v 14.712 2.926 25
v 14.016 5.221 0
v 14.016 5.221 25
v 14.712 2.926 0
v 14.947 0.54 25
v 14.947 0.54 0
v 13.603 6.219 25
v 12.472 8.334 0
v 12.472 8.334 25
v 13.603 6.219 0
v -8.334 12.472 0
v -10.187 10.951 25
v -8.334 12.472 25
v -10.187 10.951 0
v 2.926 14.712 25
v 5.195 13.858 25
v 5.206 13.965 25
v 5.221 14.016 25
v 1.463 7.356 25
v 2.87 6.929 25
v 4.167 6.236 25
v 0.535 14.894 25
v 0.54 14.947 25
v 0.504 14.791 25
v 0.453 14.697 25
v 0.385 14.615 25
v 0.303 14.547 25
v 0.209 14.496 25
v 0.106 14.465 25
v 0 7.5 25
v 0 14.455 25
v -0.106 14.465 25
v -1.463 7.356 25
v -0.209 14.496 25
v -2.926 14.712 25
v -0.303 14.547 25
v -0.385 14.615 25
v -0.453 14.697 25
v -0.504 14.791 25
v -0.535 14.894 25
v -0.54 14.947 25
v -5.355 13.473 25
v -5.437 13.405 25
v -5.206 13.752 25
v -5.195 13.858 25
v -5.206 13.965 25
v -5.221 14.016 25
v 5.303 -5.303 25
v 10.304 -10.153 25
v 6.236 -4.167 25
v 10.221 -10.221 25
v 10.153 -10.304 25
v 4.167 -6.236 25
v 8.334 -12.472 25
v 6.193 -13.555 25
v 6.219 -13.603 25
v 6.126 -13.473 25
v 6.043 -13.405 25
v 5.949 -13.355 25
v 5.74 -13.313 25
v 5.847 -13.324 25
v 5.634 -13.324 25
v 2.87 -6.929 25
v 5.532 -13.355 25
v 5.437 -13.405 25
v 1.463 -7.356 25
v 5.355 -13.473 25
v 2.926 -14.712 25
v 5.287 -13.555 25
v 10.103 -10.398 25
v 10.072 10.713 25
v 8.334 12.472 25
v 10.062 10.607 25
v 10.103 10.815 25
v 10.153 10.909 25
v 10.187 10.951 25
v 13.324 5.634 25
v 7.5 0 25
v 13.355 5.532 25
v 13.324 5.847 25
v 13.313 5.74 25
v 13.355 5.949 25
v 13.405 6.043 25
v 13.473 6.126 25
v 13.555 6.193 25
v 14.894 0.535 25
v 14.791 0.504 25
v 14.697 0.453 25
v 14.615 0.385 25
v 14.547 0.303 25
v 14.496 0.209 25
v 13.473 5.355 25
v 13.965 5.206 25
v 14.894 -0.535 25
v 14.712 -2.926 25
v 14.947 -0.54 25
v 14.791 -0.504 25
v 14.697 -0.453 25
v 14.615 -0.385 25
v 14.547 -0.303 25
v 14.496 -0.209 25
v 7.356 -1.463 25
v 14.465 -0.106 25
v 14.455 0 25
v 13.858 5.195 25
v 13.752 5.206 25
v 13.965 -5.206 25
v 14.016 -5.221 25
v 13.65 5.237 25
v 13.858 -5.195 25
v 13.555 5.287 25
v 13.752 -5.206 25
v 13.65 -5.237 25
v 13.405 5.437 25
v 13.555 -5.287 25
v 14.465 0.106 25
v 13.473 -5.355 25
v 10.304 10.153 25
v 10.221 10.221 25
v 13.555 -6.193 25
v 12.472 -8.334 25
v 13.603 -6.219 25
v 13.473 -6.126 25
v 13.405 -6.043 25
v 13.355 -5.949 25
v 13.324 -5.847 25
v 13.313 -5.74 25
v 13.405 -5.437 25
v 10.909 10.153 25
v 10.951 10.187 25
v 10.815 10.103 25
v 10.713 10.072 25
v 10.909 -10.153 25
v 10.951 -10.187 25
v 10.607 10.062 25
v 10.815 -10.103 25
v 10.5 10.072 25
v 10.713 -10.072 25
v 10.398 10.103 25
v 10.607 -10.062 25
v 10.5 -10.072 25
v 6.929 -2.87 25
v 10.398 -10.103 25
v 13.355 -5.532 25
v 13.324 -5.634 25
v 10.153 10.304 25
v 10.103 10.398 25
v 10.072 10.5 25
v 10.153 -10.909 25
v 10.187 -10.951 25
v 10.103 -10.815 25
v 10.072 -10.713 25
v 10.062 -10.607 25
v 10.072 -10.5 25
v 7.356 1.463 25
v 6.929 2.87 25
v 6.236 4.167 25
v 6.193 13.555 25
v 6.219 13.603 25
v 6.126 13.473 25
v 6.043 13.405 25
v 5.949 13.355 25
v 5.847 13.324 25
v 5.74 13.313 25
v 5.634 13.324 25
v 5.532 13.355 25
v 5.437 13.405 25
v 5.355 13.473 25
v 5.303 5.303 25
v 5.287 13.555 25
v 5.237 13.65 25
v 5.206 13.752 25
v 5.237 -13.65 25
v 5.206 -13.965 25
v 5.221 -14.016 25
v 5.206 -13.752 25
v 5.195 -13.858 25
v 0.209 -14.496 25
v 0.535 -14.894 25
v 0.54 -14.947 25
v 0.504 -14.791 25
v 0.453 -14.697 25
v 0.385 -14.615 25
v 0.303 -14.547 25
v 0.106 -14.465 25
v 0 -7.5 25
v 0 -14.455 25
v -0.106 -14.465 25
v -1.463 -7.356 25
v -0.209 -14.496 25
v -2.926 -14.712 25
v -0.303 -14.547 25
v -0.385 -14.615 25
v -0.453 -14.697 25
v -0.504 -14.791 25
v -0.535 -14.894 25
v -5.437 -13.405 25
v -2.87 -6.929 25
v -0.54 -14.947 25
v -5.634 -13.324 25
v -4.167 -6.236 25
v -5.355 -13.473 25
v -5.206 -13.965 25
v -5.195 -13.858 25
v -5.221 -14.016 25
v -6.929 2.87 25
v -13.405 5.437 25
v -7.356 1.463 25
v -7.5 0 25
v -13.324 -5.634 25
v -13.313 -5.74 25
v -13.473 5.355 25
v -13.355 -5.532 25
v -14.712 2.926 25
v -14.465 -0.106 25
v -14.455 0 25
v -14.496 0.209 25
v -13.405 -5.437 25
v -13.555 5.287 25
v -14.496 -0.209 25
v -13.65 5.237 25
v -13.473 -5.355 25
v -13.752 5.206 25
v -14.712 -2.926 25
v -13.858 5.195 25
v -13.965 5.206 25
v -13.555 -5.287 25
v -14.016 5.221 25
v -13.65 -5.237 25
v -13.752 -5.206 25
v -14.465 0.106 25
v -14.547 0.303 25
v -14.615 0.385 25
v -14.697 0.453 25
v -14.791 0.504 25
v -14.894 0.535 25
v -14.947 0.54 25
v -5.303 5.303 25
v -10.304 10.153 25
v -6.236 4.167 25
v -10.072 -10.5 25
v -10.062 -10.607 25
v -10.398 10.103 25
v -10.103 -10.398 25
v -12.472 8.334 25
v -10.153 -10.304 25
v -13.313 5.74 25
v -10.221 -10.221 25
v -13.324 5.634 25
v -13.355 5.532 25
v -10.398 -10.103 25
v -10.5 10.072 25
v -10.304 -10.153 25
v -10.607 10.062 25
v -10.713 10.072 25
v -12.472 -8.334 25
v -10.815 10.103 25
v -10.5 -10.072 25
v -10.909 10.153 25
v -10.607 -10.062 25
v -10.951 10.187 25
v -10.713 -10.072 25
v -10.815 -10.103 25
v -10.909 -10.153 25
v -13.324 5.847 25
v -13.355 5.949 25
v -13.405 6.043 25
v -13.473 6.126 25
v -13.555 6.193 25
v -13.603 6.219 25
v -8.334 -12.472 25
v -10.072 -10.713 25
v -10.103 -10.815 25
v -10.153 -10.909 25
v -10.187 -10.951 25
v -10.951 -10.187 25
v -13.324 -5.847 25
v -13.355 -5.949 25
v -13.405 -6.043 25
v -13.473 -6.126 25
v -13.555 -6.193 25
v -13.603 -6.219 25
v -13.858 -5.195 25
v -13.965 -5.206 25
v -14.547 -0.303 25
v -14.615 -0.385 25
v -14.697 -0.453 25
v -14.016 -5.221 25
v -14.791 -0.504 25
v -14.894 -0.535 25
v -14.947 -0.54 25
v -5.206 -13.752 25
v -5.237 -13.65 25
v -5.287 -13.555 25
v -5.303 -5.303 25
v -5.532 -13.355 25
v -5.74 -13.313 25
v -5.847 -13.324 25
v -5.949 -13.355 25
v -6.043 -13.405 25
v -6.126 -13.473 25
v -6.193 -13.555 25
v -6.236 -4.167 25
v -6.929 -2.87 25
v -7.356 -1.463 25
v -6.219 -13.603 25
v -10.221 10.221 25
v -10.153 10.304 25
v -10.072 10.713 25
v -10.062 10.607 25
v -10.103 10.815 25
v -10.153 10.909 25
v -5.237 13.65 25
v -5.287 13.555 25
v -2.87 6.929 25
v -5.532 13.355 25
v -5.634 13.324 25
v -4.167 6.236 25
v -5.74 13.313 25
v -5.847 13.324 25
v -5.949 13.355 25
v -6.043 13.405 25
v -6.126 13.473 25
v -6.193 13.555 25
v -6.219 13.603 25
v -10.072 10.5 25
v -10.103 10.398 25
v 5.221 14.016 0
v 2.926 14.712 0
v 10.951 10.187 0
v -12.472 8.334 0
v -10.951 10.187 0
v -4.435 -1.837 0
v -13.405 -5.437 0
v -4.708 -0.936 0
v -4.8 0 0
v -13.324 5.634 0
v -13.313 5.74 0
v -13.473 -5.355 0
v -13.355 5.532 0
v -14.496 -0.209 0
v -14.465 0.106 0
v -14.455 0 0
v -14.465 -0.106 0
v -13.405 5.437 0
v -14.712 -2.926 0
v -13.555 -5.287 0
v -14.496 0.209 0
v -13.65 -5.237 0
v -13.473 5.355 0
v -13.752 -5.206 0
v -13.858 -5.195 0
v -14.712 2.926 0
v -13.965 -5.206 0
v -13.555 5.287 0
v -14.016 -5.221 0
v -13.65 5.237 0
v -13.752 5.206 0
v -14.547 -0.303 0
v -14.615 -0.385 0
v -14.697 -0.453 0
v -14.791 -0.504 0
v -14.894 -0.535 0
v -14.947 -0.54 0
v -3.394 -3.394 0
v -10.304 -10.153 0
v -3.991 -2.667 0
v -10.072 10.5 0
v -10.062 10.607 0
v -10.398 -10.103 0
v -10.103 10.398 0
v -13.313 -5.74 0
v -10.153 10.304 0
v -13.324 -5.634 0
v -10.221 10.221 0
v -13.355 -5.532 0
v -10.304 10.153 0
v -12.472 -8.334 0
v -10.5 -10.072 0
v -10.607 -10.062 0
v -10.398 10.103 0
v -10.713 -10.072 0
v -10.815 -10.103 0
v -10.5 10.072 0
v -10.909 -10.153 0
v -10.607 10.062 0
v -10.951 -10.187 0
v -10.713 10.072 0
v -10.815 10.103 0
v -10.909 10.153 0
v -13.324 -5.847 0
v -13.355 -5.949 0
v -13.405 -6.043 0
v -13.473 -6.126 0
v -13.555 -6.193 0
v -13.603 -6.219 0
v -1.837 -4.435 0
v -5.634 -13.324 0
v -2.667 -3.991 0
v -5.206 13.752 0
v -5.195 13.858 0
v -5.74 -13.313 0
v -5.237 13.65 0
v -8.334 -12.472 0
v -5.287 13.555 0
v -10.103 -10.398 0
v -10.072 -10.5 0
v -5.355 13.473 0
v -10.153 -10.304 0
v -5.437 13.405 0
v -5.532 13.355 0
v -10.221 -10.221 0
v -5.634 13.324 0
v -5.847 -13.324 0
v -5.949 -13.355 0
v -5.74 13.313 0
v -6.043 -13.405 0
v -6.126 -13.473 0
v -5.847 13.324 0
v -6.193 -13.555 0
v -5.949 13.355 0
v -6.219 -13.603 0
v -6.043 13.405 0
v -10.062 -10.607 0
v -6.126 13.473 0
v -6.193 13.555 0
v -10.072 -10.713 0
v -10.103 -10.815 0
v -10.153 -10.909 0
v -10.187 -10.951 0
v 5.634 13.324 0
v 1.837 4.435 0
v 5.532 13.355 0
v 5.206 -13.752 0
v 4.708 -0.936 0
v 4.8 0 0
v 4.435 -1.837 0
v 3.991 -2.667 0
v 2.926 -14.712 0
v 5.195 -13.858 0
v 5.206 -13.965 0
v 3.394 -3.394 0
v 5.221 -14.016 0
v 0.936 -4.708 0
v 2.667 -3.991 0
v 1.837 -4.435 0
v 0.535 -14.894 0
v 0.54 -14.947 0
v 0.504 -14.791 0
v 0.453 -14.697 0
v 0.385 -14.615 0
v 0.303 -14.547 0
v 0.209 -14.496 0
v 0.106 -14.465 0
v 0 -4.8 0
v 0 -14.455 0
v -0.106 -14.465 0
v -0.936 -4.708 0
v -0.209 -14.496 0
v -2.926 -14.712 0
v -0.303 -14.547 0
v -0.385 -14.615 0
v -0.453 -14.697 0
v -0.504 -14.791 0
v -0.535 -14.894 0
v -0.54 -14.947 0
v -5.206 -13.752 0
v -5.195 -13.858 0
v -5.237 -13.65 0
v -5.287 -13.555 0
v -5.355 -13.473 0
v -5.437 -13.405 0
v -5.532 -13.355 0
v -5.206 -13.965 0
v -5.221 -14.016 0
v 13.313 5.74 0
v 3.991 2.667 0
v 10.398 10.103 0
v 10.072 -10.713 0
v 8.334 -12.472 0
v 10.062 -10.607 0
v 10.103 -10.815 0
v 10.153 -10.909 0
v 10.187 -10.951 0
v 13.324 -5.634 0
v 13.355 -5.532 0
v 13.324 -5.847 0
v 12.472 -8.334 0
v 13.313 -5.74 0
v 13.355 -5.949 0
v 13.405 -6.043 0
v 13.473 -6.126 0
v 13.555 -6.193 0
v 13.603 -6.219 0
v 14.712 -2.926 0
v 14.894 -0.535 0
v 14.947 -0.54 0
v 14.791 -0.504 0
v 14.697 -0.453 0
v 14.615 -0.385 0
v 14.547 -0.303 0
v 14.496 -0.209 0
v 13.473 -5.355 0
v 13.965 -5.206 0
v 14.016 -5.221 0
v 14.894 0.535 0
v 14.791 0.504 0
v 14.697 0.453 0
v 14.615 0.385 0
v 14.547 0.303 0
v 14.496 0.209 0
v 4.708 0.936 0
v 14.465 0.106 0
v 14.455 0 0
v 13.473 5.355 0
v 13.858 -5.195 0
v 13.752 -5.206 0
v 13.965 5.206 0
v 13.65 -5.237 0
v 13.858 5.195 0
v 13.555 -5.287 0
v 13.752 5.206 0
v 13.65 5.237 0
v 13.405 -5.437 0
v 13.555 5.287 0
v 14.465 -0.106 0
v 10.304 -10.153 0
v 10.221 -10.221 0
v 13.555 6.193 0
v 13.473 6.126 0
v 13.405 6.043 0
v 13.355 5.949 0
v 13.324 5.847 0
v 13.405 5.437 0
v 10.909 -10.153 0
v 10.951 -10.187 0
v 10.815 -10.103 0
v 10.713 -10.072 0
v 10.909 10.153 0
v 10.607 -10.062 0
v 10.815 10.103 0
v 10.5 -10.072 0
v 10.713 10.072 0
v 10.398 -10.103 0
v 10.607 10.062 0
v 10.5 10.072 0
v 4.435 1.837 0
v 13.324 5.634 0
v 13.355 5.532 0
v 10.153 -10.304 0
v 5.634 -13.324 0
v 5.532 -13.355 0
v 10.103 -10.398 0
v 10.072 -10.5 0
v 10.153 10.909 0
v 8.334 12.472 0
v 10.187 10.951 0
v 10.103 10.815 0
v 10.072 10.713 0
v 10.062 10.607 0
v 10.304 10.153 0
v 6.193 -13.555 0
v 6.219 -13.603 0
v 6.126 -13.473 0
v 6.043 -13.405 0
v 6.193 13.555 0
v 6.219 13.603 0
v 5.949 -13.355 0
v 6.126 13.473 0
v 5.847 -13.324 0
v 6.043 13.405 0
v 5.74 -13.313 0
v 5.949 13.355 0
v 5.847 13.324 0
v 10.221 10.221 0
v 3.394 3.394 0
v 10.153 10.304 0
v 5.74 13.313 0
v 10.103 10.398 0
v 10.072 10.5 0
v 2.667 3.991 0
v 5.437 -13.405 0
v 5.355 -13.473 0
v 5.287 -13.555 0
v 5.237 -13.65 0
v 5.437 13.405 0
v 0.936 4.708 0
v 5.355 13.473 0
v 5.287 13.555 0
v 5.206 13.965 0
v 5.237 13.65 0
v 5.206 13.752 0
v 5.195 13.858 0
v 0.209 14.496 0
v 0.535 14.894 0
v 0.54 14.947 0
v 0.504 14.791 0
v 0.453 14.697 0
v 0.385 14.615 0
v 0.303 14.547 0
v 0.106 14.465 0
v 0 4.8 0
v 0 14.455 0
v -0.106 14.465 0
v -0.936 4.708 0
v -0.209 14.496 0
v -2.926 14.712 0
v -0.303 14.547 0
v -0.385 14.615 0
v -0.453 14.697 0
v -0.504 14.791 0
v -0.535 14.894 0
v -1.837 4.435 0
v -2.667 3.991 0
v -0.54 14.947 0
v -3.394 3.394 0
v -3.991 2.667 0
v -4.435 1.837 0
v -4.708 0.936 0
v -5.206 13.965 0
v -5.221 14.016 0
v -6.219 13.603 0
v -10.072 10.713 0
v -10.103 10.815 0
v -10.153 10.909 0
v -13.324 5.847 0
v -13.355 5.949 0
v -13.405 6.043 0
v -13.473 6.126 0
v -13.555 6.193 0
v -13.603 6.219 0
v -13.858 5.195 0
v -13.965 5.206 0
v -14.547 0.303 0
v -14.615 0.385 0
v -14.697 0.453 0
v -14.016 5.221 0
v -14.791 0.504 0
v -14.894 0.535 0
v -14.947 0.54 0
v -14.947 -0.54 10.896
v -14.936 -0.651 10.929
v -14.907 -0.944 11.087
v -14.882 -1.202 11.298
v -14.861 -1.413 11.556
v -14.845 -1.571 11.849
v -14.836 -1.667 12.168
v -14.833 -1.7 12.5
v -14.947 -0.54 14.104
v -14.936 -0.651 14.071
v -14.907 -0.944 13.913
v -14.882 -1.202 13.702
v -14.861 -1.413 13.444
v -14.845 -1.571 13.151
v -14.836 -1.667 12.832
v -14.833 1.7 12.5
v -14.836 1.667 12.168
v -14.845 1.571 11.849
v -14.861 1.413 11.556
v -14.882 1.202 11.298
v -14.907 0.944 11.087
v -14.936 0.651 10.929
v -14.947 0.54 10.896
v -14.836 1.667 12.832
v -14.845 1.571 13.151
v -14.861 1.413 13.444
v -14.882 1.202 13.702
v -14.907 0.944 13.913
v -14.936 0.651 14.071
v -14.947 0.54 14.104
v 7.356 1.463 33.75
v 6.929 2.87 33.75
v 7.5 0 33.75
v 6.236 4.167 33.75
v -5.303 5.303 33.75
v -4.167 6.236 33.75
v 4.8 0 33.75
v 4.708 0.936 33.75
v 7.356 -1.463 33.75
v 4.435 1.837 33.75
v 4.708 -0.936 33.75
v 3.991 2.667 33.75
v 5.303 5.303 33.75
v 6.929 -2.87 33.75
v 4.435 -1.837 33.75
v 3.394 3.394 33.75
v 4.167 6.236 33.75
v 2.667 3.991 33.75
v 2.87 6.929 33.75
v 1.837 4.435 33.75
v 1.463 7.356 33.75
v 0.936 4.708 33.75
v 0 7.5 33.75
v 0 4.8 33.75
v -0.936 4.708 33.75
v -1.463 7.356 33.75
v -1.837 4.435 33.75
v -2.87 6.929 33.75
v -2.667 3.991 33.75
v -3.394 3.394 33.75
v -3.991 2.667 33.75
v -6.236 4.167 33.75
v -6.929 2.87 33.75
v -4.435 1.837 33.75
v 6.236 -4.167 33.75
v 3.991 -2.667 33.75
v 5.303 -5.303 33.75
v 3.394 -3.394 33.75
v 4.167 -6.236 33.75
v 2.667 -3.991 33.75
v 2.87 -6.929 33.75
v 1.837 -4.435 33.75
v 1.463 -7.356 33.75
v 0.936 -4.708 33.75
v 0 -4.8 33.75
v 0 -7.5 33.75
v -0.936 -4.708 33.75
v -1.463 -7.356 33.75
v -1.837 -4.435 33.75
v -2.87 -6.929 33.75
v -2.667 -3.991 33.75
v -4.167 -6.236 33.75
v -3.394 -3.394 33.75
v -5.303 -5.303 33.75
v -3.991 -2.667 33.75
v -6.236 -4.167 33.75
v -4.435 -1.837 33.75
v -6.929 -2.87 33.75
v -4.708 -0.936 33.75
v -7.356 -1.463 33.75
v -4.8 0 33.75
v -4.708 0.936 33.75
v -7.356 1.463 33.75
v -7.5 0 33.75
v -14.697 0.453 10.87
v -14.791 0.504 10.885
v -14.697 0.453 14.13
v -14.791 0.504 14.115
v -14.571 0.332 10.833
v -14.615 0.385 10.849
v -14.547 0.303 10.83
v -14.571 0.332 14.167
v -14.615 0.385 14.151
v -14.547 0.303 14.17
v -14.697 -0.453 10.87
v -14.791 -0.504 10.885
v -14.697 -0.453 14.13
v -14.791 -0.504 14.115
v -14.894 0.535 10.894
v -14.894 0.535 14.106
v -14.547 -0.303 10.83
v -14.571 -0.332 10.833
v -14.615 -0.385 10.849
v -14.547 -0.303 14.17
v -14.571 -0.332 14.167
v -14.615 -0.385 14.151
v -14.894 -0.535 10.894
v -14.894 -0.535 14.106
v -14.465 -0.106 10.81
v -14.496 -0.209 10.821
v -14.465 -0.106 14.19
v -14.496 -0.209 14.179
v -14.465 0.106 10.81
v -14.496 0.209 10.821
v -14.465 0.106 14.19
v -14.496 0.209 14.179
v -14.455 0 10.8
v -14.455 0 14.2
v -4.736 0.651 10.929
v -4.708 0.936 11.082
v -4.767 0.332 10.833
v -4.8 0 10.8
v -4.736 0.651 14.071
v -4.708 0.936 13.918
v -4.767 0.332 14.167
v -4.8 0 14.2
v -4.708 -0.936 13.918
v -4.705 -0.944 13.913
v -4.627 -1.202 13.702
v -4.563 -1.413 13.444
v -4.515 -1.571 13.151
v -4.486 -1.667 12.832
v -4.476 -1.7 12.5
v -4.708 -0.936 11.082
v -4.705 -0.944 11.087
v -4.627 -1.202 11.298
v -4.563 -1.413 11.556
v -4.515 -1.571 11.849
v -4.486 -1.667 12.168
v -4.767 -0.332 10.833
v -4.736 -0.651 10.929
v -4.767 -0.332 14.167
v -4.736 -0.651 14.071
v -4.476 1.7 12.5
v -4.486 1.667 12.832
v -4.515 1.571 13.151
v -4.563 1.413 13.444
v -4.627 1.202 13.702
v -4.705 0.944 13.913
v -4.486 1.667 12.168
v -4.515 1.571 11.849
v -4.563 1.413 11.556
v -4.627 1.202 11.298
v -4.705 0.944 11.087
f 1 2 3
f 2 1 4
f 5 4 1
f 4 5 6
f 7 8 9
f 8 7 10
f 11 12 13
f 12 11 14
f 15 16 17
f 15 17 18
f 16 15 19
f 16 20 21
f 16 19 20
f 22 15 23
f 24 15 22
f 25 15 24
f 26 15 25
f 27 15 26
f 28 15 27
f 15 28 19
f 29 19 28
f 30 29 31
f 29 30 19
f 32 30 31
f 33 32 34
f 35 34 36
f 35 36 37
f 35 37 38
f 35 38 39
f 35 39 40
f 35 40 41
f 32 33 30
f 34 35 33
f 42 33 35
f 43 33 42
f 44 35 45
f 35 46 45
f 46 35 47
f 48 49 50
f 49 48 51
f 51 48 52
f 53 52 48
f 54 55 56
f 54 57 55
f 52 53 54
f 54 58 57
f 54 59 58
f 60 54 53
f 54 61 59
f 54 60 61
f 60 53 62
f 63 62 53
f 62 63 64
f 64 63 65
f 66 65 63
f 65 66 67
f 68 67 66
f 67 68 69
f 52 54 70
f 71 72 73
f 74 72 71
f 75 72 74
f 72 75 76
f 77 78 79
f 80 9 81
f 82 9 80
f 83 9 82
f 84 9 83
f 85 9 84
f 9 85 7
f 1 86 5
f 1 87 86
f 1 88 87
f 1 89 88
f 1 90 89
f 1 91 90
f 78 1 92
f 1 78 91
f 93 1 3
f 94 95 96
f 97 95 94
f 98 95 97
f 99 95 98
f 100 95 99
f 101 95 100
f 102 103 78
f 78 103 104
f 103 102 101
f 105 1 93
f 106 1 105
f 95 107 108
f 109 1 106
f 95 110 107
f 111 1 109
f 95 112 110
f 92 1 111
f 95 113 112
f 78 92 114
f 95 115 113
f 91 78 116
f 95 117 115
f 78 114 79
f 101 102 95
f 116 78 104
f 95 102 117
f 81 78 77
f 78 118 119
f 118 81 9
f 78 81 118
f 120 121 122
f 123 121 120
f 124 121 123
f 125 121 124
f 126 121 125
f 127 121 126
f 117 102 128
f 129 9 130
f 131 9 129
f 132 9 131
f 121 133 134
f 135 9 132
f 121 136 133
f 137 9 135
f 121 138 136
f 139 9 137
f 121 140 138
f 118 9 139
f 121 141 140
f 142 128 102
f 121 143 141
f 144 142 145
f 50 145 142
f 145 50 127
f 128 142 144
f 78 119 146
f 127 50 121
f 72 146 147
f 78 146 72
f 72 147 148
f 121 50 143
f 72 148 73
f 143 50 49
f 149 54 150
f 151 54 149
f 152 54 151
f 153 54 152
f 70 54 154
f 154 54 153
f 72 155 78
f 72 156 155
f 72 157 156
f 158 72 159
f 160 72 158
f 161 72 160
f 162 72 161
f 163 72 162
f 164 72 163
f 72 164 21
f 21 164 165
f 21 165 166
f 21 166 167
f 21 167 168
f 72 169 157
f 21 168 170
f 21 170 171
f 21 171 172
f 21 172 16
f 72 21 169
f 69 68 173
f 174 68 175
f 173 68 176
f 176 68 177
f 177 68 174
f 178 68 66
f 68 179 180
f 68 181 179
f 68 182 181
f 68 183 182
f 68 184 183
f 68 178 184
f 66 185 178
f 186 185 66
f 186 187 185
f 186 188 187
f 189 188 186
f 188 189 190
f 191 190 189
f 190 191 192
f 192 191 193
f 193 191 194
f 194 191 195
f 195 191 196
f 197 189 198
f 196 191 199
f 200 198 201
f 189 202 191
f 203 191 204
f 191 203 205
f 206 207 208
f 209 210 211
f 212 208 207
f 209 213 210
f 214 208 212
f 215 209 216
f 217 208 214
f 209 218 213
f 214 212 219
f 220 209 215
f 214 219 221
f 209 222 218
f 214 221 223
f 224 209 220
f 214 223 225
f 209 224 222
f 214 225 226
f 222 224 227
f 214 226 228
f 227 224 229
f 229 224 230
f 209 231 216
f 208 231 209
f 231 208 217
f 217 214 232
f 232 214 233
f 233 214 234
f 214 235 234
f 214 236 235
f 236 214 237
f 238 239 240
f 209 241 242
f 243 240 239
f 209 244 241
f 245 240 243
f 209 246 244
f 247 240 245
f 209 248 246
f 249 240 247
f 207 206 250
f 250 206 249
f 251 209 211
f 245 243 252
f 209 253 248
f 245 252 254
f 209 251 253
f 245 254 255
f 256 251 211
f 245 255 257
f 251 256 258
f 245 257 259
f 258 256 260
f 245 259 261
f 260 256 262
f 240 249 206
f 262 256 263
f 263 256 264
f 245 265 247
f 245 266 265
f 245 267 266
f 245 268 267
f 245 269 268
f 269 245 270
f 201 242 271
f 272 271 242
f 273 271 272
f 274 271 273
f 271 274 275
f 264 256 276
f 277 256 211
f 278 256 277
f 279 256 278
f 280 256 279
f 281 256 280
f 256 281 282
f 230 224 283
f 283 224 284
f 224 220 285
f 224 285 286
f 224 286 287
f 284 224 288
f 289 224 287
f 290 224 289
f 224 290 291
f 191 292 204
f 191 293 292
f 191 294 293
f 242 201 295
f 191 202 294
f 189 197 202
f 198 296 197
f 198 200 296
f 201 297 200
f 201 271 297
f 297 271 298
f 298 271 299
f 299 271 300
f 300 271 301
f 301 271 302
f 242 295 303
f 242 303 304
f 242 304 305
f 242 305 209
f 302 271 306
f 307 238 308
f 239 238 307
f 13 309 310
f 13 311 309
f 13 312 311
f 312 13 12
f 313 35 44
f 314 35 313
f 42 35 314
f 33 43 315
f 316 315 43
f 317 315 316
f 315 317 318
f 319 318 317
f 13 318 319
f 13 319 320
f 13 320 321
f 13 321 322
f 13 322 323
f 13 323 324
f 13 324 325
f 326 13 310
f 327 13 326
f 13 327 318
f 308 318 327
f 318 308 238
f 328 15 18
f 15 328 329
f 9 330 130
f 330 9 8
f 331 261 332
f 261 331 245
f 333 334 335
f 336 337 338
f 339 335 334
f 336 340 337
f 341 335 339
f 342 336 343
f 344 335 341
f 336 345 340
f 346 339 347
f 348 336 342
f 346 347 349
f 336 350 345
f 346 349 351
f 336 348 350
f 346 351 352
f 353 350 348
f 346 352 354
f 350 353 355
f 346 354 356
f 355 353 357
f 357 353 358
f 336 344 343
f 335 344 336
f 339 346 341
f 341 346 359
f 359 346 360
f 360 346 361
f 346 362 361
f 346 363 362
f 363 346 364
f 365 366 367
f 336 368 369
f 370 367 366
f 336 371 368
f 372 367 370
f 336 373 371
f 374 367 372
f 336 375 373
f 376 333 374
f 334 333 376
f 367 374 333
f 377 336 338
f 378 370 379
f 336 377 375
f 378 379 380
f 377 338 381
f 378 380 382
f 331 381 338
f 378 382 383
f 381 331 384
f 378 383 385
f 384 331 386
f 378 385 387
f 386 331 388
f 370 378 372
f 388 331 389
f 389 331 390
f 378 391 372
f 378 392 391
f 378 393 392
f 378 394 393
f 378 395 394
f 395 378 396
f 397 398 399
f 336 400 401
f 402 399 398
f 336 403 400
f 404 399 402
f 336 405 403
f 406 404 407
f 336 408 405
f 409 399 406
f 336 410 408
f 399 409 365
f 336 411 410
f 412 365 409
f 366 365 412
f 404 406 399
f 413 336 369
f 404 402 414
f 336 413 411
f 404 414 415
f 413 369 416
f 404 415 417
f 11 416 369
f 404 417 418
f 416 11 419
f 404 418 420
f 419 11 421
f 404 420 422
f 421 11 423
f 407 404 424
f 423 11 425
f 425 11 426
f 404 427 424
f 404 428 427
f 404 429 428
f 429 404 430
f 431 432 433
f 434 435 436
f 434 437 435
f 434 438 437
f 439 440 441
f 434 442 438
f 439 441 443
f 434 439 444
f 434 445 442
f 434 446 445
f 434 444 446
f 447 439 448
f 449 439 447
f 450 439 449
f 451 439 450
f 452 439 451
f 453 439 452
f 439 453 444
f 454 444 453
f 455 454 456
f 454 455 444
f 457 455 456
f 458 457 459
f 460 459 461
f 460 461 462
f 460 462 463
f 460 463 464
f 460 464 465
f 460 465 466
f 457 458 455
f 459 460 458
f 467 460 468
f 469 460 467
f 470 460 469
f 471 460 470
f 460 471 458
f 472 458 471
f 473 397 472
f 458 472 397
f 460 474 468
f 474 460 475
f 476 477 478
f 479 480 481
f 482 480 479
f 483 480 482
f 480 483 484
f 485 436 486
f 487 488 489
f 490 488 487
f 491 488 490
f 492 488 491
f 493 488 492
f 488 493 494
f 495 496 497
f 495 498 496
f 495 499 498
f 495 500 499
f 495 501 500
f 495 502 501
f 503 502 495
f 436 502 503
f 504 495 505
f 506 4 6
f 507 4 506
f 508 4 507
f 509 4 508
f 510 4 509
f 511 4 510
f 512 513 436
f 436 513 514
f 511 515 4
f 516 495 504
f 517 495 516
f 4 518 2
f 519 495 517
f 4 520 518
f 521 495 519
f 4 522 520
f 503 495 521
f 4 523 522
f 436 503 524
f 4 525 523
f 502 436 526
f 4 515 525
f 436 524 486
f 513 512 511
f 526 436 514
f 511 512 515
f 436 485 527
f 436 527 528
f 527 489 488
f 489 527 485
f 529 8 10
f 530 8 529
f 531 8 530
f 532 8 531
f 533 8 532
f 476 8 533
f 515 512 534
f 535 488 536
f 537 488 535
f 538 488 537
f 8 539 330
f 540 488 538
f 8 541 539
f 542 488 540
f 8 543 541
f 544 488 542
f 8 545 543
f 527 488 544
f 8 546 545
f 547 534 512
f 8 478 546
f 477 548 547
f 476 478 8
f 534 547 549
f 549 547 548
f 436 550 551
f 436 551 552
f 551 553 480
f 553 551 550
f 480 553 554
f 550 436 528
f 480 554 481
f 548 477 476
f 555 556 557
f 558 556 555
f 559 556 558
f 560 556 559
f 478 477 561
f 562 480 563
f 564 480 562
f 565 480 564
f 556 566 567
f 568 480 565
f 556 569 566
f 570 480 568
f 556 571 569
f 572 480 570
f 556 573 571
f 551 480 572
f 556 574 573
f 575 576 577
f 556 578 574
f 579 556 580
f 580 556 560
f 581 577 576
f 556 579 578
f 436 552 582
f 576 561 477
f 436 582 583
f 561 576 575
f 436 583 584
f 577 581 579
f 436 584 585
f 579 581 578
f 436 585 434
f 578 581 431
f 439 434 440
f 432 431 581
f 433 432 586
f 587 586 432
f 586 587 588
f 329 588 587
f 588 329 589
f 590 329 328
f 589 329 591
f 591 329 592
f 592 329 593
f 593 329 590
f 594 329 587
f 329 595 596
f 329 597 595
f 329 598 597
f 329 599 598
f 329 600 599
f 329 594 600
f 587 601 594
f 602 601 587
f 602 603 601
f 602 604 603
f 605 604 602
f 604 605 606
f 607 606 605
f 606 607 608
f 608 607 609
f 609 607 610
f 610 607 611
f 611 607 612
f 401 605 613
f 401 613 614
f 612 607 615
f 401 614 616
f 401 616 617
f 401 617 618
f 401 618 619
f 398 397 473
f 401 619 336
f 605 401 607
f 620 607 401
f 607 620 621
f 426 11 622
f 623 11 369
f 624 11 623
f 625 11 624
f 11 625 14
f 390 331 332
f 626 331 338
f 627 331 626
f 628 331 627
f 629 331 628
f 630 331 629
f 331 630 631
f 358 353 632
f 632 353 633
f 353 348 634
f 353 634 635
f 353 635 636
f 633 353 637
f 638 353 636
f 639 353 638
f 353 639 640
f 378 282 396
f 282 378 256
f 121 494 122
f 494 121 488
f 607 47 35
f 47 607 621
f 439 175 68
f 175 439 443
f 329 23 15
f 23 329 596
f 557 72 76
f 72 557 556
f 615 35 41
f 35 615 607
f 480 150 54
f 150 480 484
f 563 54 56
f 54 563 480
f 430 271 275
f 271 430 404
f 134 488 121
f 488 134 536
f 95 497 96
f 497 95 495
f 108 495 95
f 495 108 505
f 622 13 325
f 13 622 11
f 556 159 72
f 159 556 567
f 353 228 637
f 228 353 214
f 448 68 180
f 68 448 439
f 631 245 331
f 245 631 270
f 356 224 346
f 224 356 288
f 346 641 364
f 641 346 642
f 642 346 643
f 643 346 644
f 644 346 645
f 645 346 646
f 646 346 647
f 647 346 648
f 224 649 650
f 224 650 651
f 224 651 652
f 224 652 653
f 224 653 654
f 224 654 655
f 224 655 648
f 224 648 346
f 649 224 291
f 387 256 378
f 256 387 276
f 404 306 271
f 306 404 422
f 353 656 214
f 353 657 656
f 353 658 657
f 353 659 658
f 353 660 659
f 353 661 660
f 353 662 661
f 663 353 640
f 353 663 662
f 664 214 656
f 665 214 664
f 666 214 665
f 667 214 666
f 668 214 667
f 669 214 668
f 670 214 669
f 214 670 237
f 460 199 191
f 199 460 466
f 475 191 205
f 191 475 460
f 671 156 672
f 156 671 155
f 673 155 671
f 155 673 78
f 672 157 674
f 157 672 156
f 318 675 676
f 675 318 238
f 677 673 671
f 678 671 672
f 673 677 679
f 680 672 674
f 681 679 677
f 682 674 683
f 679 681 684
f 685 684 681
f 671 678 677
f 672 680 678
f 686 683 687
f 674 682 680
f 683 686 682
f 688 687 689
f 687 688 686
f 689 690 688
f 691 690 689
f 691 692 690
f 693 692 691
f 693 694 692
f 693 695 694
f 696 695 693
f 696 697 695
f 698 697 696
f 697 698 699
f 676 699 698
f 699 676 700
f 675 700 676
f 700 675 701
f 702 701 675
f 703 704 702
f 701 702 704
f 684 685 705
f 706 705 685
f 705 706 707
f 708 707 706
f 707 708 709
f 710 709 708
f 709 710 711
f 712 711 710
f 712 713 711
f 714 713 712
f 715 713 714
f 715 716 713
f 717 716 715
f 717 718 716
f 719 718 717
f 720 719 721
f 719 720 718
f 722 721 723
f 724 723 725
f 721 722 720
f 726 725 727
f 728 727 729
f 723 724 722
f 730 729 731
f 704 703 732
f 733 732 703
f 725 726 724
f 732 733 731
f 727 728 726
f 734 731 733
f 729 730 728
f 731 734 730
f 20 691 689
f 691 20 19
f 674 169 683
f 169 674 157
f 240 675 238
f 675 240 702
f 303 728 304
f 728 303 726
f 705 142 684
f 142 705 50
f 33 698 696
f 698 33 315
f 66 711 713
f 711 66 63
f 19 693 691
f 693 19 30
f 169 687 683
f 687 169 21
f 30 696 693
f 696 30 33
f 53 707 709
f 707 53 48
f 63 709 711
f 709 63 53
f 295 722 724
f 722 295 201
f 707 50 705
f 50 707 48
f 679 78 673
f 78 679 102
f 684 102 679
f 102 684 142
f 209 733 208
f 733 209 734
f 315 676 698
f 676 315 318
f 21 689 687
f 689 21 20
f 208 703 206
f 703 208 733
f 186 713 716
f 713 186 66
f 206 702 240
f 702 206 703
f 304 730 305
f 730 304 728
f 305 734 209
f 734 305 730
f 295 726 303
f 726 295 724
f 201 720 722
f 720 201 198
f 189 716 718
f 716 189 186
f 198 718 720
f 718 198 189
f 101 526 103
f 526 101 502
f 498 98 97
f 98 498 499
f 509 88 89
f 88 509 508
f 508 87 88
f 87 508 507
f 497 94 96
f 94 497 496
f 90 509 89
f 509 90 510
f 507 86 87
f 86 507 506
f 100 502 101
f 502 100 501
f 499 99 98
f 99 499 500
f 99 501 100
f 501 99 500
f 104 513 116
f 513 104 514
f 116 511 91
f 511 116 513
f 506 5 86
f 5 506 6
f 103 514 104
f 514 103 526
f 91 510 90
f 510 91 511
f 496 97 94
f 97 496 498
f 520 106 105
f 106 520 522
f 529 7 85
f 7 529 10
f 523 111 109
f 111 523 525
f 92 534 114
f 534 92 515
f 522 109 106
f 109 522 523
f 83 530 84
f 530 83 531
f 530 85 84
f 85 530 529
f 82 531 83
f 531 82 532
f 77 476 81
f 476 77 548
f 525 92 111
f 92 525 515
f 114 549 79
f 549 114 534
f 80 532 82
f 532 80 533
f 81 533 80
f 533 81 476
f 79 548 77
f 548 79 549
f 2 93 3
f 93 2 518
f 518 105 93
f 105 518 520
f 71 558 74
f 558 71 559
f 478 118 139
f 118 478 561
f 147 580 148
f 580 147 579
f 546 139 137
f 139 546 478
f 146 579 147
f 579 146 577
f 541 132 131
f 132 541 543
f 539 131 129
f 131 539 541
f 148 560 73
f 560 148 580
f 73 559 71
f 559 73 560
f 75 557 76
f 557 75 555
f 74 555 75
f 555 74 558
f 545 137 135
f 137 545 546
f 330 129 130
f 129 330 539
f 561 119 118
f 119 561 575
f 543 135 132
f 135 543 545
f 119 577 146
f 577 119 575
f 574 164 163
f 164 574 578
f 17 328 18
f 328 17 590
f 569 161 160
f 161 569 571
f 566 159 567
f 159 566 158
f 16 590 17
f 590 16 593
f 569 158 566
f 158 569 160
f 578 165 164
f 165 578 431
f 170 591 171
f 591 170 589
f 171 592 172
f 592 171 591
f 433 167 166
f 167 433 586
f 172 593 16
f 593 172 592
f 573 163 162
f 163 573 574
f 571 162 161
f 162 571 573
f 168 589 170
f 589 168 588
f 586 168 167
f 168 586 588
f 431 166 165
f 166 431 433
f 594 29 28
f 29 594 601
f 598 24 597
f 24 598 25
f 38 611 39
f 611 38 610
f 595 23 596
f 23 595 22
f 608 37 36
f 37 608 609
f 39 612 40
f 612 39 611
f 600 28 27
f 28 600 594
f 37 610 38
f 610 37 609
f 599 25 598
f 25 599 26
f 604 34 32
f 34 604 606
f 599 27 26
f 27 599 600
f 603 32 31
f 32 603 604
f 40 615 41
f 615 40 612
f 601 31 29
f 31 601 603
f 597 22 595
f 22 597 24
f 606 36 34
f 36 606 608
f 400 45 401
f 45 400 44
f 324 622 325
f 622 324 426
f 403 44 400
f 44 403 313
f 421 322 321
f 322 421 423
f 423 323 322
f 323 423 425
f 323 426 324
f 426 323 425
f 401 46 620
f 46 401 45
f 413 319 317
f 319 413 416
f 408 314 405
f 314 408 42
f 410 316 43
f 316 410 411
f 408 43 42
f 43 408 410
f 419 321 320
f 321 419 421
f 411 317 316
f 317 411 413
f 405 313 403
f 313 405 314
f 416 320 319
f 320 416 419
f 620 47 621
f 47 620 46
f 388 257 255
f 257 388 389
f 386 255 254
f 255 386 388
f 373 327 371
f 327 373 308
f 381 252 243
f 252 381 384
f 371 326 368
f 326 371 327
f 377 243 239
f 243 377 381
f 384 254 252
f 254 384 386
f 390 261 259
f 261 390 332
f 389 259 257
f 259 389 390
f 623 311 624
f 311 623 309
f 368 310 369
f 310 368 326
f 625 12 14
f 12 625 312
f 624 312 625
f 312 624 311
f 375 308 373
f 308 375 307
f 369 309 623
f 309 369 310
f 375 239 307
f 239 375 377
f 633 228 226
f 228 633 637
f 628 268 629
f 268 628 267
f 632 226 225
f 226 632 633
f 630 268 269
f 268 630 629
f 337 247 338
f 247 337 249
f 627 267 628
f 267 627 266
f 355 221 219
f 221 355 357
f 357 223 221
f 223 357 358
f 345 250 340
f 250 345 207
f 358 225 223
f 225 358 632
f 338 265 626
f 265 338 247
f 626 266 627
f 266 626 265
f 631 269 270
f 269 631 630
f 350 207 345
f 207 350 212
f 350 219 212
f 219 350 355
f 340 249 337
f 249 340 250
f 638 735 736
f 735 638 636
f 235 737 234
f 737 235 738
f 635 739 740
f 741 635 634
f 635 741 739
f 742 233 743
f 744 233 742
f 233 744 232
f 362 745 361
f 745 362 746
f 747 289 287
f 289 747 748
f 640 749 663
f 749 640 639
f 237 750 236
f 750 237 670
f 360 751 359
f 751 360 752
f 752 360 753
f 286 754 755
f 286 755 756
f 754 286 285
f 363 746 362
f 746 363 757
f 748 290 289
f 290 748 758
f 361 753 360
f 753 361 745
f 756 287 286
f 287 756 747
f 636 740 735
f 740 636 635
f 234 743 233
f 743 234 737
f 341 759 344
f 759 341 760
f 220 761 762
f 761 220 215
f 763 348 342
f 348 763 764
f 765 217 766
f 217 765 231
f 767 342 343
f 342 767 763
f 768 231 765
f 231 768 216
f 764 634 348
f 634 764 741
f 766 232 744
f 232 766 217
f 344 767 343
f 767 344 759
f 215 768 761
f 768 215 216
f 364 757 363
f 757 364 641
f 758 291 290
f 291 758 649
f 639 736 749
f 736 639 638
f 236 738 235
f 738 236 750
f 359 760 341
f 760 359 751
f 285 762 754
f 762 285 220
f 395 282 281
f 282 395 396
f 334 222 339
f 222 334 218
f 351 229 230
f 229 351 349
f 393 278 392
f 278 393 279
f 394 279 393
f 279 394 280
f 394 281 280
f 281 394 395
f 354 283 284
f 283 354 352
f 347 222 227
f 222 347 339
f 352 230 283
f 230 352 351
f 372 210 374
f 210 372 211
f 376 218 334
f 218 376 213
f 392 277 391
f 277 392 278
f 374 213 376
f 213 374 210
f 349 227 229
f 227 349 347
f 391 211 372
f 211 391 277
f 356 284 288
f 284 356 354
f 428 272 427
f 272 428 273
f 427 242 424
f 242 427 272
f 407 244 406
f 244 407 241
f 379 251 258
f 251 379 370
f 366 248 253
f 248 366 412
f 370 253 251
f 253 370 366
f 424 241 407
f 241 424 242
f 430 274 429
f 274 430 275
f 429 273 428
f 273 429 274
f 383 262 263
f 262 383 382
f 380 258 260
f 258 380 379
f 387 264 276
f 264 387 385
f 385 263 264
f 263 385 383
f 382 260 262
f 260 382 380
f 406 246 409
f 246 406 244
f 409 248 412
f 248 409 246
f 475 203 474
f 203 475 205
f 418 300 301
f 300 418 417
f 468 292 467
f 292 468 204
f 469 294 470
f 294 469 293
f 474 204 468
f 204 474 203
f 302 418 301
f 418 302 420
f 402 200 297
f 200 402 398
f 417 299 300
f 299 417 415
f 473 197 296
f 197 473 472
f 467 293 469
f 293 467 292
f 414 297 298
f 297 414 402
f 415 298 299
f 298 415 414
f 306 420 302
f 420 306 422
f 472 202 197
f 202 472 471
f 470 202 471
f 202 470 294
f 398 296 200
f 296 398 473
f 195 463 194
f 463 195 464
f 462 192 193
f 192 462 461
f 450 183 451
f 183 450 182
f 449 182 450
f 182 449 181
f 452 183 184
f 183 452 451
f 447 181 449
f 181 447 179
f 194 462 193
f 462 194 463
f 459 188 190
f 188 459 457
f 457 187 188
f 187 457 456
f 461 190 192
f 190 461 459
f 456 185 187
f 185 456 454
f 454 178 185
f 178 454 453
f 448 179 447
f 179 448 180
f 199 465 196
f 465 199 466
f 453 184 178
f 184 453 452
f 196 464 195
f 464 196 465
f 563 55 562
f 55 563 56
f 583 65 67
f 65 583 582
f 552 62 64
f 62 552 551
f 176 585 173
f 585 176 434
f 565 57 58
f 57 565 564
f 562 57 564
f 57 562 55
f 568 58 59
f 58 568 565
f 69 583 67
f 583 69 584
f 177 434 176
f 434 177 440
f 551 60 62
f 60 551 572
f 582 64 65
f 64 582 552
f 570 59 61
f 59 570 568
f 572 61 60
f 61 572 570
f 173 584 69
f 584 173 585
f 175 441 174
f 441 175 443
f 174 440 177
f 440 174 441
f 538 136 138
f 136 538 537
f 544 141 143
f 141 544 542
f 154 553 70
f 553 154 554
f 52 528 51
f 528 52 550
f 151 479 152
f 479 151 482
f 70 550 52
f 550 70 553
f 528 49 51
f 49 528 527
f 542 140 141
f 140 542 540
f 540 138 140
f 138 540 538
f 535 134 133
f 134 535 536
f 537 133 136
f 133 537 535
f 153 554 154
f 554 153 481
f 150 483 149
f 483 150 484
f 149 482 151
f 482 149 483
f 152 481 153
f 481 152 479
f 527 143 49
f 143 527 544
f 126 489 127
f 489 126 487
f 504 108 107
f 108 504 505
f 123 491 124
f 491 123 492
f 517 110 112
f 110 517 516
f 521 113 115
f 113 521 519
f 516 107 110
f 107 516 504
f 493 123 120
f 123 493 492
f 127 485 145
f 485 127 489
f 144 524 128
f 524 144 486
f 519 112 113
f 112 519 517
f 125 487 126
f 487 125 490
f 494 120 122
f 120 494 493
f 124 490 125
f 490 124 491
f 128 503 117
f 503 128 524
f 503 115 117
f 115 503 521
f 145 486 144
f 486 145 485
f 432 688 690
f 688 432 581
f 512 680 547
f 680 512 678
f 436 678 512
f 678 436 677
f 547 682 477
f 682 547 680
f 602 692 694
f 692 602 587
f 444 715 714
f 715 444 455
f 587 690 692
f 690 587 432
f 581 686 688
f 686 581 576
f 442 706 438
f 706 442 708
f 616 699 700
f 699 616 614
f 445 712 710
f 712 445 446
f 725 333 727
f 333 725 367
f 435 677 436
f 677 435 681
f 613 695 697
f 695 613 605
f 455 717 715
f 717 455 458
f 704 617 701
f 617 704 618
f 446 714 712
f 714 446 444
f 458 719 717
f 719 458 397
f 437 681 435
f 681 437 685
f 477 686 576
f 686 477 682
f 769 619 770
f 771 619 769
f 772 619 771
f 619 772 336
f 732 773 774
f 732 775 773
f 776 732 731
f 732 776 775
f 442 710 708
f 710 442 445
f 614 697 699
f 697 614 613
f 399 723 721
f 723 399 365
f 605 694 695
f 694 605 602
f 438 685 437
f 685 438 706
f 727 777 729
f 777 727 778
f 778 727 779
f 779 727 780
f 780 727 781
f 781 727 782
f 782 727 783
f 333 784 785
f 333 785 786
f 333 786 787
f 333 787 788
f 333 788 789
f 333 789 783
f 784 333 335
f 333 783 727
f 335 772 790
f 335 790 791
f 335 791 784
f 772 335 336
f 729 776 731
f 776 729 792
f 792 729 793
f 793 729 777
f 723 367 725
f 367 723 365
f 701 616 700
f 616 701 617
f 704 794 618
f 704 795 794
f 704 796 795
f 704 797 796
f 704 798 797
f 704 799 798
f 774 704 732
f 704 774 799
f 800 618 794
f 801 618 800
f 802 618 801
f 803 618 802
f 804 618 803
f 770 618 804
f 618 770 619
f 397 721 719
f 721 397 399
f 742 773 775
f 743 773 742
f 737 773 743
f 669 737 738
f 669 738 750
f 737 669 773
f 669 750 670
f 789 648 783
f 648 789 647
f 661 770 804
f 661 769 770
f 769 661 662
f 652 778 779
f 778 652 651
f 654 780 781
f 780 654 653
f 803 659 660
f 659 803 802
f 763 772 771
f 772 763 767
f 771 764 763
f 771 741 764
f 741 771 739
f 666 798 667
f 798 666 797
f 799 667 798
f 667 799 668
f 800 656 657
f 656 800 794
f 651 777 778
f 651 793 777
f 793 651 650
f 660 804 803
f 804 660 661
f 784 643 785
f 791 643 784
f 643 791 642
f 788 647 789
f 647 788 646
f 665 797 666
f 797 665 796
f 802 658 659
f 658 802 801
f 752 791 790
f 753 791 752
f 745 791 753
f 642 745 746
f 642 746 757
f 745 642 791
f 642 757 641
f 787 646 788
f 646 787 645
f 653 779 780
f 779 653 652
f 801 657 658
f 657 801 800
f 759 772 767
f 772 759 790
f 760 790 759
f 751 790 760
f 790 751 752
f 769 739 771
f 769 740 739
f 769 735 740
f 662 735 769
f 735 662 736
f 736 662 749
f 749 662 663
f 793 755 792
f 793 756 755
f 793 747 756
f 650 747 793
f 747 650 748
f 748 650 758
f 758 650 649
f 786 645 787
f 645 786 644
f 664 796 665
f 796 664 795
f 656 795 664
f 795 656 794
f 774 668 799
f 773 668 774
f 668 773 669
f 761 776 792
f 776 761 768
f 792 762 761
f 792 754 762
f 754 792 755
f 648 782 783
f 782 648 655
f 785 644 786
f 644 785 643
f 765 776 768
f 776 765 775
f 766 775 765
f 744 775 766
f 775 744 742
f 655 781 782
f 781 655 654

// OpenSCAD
$fn = 32;

// ----------------------------------------------------------------------
// Hand knob: 30 x 30 x 33.75 mm
// ----------------------------------------------------------------------

// --- parameters (mm) ---
head_d = 30;              // knob diameter
head_h = 25;              // knob height
hole_d = 9.6;             // shaft bore
set_d = 3.4;              // set screw tap hole
notch_d = 1.09;           // knurl groove diameter
knurl_n = 16;             // number of knurl grooves
cap_h = 8.75;             // raised centre cap
cap_d = 15;               // centre cap diameter

module body() {
  cylinder(h = head_h, d = head_d);
}

module cap() {
  translate([0, 0, head_h - 1]) cylinder(h = cap_h + 1, d = cap_d);
}

difference() {
  union() {
    body();
    cap();
  }
  translate([0, 0, -1]) cylinder(h = head_h + cap_h + 2, d = hole_d);
  /* knurl grooves */
  for (i = [0 : knurl_n - 1])
    rotate([0, 0, i * 360 / knurl_n])
      translate([head_d / 2, 0, -0.5])
        cylinder(h = head_h + 1, d = notch_d);
  translate([-head_d / 2 - 1, 0, head_h * 0.5]) rotate([0, 90, 0]) cylinder(h = head_d / 2 + 2, d = set_d);
}
